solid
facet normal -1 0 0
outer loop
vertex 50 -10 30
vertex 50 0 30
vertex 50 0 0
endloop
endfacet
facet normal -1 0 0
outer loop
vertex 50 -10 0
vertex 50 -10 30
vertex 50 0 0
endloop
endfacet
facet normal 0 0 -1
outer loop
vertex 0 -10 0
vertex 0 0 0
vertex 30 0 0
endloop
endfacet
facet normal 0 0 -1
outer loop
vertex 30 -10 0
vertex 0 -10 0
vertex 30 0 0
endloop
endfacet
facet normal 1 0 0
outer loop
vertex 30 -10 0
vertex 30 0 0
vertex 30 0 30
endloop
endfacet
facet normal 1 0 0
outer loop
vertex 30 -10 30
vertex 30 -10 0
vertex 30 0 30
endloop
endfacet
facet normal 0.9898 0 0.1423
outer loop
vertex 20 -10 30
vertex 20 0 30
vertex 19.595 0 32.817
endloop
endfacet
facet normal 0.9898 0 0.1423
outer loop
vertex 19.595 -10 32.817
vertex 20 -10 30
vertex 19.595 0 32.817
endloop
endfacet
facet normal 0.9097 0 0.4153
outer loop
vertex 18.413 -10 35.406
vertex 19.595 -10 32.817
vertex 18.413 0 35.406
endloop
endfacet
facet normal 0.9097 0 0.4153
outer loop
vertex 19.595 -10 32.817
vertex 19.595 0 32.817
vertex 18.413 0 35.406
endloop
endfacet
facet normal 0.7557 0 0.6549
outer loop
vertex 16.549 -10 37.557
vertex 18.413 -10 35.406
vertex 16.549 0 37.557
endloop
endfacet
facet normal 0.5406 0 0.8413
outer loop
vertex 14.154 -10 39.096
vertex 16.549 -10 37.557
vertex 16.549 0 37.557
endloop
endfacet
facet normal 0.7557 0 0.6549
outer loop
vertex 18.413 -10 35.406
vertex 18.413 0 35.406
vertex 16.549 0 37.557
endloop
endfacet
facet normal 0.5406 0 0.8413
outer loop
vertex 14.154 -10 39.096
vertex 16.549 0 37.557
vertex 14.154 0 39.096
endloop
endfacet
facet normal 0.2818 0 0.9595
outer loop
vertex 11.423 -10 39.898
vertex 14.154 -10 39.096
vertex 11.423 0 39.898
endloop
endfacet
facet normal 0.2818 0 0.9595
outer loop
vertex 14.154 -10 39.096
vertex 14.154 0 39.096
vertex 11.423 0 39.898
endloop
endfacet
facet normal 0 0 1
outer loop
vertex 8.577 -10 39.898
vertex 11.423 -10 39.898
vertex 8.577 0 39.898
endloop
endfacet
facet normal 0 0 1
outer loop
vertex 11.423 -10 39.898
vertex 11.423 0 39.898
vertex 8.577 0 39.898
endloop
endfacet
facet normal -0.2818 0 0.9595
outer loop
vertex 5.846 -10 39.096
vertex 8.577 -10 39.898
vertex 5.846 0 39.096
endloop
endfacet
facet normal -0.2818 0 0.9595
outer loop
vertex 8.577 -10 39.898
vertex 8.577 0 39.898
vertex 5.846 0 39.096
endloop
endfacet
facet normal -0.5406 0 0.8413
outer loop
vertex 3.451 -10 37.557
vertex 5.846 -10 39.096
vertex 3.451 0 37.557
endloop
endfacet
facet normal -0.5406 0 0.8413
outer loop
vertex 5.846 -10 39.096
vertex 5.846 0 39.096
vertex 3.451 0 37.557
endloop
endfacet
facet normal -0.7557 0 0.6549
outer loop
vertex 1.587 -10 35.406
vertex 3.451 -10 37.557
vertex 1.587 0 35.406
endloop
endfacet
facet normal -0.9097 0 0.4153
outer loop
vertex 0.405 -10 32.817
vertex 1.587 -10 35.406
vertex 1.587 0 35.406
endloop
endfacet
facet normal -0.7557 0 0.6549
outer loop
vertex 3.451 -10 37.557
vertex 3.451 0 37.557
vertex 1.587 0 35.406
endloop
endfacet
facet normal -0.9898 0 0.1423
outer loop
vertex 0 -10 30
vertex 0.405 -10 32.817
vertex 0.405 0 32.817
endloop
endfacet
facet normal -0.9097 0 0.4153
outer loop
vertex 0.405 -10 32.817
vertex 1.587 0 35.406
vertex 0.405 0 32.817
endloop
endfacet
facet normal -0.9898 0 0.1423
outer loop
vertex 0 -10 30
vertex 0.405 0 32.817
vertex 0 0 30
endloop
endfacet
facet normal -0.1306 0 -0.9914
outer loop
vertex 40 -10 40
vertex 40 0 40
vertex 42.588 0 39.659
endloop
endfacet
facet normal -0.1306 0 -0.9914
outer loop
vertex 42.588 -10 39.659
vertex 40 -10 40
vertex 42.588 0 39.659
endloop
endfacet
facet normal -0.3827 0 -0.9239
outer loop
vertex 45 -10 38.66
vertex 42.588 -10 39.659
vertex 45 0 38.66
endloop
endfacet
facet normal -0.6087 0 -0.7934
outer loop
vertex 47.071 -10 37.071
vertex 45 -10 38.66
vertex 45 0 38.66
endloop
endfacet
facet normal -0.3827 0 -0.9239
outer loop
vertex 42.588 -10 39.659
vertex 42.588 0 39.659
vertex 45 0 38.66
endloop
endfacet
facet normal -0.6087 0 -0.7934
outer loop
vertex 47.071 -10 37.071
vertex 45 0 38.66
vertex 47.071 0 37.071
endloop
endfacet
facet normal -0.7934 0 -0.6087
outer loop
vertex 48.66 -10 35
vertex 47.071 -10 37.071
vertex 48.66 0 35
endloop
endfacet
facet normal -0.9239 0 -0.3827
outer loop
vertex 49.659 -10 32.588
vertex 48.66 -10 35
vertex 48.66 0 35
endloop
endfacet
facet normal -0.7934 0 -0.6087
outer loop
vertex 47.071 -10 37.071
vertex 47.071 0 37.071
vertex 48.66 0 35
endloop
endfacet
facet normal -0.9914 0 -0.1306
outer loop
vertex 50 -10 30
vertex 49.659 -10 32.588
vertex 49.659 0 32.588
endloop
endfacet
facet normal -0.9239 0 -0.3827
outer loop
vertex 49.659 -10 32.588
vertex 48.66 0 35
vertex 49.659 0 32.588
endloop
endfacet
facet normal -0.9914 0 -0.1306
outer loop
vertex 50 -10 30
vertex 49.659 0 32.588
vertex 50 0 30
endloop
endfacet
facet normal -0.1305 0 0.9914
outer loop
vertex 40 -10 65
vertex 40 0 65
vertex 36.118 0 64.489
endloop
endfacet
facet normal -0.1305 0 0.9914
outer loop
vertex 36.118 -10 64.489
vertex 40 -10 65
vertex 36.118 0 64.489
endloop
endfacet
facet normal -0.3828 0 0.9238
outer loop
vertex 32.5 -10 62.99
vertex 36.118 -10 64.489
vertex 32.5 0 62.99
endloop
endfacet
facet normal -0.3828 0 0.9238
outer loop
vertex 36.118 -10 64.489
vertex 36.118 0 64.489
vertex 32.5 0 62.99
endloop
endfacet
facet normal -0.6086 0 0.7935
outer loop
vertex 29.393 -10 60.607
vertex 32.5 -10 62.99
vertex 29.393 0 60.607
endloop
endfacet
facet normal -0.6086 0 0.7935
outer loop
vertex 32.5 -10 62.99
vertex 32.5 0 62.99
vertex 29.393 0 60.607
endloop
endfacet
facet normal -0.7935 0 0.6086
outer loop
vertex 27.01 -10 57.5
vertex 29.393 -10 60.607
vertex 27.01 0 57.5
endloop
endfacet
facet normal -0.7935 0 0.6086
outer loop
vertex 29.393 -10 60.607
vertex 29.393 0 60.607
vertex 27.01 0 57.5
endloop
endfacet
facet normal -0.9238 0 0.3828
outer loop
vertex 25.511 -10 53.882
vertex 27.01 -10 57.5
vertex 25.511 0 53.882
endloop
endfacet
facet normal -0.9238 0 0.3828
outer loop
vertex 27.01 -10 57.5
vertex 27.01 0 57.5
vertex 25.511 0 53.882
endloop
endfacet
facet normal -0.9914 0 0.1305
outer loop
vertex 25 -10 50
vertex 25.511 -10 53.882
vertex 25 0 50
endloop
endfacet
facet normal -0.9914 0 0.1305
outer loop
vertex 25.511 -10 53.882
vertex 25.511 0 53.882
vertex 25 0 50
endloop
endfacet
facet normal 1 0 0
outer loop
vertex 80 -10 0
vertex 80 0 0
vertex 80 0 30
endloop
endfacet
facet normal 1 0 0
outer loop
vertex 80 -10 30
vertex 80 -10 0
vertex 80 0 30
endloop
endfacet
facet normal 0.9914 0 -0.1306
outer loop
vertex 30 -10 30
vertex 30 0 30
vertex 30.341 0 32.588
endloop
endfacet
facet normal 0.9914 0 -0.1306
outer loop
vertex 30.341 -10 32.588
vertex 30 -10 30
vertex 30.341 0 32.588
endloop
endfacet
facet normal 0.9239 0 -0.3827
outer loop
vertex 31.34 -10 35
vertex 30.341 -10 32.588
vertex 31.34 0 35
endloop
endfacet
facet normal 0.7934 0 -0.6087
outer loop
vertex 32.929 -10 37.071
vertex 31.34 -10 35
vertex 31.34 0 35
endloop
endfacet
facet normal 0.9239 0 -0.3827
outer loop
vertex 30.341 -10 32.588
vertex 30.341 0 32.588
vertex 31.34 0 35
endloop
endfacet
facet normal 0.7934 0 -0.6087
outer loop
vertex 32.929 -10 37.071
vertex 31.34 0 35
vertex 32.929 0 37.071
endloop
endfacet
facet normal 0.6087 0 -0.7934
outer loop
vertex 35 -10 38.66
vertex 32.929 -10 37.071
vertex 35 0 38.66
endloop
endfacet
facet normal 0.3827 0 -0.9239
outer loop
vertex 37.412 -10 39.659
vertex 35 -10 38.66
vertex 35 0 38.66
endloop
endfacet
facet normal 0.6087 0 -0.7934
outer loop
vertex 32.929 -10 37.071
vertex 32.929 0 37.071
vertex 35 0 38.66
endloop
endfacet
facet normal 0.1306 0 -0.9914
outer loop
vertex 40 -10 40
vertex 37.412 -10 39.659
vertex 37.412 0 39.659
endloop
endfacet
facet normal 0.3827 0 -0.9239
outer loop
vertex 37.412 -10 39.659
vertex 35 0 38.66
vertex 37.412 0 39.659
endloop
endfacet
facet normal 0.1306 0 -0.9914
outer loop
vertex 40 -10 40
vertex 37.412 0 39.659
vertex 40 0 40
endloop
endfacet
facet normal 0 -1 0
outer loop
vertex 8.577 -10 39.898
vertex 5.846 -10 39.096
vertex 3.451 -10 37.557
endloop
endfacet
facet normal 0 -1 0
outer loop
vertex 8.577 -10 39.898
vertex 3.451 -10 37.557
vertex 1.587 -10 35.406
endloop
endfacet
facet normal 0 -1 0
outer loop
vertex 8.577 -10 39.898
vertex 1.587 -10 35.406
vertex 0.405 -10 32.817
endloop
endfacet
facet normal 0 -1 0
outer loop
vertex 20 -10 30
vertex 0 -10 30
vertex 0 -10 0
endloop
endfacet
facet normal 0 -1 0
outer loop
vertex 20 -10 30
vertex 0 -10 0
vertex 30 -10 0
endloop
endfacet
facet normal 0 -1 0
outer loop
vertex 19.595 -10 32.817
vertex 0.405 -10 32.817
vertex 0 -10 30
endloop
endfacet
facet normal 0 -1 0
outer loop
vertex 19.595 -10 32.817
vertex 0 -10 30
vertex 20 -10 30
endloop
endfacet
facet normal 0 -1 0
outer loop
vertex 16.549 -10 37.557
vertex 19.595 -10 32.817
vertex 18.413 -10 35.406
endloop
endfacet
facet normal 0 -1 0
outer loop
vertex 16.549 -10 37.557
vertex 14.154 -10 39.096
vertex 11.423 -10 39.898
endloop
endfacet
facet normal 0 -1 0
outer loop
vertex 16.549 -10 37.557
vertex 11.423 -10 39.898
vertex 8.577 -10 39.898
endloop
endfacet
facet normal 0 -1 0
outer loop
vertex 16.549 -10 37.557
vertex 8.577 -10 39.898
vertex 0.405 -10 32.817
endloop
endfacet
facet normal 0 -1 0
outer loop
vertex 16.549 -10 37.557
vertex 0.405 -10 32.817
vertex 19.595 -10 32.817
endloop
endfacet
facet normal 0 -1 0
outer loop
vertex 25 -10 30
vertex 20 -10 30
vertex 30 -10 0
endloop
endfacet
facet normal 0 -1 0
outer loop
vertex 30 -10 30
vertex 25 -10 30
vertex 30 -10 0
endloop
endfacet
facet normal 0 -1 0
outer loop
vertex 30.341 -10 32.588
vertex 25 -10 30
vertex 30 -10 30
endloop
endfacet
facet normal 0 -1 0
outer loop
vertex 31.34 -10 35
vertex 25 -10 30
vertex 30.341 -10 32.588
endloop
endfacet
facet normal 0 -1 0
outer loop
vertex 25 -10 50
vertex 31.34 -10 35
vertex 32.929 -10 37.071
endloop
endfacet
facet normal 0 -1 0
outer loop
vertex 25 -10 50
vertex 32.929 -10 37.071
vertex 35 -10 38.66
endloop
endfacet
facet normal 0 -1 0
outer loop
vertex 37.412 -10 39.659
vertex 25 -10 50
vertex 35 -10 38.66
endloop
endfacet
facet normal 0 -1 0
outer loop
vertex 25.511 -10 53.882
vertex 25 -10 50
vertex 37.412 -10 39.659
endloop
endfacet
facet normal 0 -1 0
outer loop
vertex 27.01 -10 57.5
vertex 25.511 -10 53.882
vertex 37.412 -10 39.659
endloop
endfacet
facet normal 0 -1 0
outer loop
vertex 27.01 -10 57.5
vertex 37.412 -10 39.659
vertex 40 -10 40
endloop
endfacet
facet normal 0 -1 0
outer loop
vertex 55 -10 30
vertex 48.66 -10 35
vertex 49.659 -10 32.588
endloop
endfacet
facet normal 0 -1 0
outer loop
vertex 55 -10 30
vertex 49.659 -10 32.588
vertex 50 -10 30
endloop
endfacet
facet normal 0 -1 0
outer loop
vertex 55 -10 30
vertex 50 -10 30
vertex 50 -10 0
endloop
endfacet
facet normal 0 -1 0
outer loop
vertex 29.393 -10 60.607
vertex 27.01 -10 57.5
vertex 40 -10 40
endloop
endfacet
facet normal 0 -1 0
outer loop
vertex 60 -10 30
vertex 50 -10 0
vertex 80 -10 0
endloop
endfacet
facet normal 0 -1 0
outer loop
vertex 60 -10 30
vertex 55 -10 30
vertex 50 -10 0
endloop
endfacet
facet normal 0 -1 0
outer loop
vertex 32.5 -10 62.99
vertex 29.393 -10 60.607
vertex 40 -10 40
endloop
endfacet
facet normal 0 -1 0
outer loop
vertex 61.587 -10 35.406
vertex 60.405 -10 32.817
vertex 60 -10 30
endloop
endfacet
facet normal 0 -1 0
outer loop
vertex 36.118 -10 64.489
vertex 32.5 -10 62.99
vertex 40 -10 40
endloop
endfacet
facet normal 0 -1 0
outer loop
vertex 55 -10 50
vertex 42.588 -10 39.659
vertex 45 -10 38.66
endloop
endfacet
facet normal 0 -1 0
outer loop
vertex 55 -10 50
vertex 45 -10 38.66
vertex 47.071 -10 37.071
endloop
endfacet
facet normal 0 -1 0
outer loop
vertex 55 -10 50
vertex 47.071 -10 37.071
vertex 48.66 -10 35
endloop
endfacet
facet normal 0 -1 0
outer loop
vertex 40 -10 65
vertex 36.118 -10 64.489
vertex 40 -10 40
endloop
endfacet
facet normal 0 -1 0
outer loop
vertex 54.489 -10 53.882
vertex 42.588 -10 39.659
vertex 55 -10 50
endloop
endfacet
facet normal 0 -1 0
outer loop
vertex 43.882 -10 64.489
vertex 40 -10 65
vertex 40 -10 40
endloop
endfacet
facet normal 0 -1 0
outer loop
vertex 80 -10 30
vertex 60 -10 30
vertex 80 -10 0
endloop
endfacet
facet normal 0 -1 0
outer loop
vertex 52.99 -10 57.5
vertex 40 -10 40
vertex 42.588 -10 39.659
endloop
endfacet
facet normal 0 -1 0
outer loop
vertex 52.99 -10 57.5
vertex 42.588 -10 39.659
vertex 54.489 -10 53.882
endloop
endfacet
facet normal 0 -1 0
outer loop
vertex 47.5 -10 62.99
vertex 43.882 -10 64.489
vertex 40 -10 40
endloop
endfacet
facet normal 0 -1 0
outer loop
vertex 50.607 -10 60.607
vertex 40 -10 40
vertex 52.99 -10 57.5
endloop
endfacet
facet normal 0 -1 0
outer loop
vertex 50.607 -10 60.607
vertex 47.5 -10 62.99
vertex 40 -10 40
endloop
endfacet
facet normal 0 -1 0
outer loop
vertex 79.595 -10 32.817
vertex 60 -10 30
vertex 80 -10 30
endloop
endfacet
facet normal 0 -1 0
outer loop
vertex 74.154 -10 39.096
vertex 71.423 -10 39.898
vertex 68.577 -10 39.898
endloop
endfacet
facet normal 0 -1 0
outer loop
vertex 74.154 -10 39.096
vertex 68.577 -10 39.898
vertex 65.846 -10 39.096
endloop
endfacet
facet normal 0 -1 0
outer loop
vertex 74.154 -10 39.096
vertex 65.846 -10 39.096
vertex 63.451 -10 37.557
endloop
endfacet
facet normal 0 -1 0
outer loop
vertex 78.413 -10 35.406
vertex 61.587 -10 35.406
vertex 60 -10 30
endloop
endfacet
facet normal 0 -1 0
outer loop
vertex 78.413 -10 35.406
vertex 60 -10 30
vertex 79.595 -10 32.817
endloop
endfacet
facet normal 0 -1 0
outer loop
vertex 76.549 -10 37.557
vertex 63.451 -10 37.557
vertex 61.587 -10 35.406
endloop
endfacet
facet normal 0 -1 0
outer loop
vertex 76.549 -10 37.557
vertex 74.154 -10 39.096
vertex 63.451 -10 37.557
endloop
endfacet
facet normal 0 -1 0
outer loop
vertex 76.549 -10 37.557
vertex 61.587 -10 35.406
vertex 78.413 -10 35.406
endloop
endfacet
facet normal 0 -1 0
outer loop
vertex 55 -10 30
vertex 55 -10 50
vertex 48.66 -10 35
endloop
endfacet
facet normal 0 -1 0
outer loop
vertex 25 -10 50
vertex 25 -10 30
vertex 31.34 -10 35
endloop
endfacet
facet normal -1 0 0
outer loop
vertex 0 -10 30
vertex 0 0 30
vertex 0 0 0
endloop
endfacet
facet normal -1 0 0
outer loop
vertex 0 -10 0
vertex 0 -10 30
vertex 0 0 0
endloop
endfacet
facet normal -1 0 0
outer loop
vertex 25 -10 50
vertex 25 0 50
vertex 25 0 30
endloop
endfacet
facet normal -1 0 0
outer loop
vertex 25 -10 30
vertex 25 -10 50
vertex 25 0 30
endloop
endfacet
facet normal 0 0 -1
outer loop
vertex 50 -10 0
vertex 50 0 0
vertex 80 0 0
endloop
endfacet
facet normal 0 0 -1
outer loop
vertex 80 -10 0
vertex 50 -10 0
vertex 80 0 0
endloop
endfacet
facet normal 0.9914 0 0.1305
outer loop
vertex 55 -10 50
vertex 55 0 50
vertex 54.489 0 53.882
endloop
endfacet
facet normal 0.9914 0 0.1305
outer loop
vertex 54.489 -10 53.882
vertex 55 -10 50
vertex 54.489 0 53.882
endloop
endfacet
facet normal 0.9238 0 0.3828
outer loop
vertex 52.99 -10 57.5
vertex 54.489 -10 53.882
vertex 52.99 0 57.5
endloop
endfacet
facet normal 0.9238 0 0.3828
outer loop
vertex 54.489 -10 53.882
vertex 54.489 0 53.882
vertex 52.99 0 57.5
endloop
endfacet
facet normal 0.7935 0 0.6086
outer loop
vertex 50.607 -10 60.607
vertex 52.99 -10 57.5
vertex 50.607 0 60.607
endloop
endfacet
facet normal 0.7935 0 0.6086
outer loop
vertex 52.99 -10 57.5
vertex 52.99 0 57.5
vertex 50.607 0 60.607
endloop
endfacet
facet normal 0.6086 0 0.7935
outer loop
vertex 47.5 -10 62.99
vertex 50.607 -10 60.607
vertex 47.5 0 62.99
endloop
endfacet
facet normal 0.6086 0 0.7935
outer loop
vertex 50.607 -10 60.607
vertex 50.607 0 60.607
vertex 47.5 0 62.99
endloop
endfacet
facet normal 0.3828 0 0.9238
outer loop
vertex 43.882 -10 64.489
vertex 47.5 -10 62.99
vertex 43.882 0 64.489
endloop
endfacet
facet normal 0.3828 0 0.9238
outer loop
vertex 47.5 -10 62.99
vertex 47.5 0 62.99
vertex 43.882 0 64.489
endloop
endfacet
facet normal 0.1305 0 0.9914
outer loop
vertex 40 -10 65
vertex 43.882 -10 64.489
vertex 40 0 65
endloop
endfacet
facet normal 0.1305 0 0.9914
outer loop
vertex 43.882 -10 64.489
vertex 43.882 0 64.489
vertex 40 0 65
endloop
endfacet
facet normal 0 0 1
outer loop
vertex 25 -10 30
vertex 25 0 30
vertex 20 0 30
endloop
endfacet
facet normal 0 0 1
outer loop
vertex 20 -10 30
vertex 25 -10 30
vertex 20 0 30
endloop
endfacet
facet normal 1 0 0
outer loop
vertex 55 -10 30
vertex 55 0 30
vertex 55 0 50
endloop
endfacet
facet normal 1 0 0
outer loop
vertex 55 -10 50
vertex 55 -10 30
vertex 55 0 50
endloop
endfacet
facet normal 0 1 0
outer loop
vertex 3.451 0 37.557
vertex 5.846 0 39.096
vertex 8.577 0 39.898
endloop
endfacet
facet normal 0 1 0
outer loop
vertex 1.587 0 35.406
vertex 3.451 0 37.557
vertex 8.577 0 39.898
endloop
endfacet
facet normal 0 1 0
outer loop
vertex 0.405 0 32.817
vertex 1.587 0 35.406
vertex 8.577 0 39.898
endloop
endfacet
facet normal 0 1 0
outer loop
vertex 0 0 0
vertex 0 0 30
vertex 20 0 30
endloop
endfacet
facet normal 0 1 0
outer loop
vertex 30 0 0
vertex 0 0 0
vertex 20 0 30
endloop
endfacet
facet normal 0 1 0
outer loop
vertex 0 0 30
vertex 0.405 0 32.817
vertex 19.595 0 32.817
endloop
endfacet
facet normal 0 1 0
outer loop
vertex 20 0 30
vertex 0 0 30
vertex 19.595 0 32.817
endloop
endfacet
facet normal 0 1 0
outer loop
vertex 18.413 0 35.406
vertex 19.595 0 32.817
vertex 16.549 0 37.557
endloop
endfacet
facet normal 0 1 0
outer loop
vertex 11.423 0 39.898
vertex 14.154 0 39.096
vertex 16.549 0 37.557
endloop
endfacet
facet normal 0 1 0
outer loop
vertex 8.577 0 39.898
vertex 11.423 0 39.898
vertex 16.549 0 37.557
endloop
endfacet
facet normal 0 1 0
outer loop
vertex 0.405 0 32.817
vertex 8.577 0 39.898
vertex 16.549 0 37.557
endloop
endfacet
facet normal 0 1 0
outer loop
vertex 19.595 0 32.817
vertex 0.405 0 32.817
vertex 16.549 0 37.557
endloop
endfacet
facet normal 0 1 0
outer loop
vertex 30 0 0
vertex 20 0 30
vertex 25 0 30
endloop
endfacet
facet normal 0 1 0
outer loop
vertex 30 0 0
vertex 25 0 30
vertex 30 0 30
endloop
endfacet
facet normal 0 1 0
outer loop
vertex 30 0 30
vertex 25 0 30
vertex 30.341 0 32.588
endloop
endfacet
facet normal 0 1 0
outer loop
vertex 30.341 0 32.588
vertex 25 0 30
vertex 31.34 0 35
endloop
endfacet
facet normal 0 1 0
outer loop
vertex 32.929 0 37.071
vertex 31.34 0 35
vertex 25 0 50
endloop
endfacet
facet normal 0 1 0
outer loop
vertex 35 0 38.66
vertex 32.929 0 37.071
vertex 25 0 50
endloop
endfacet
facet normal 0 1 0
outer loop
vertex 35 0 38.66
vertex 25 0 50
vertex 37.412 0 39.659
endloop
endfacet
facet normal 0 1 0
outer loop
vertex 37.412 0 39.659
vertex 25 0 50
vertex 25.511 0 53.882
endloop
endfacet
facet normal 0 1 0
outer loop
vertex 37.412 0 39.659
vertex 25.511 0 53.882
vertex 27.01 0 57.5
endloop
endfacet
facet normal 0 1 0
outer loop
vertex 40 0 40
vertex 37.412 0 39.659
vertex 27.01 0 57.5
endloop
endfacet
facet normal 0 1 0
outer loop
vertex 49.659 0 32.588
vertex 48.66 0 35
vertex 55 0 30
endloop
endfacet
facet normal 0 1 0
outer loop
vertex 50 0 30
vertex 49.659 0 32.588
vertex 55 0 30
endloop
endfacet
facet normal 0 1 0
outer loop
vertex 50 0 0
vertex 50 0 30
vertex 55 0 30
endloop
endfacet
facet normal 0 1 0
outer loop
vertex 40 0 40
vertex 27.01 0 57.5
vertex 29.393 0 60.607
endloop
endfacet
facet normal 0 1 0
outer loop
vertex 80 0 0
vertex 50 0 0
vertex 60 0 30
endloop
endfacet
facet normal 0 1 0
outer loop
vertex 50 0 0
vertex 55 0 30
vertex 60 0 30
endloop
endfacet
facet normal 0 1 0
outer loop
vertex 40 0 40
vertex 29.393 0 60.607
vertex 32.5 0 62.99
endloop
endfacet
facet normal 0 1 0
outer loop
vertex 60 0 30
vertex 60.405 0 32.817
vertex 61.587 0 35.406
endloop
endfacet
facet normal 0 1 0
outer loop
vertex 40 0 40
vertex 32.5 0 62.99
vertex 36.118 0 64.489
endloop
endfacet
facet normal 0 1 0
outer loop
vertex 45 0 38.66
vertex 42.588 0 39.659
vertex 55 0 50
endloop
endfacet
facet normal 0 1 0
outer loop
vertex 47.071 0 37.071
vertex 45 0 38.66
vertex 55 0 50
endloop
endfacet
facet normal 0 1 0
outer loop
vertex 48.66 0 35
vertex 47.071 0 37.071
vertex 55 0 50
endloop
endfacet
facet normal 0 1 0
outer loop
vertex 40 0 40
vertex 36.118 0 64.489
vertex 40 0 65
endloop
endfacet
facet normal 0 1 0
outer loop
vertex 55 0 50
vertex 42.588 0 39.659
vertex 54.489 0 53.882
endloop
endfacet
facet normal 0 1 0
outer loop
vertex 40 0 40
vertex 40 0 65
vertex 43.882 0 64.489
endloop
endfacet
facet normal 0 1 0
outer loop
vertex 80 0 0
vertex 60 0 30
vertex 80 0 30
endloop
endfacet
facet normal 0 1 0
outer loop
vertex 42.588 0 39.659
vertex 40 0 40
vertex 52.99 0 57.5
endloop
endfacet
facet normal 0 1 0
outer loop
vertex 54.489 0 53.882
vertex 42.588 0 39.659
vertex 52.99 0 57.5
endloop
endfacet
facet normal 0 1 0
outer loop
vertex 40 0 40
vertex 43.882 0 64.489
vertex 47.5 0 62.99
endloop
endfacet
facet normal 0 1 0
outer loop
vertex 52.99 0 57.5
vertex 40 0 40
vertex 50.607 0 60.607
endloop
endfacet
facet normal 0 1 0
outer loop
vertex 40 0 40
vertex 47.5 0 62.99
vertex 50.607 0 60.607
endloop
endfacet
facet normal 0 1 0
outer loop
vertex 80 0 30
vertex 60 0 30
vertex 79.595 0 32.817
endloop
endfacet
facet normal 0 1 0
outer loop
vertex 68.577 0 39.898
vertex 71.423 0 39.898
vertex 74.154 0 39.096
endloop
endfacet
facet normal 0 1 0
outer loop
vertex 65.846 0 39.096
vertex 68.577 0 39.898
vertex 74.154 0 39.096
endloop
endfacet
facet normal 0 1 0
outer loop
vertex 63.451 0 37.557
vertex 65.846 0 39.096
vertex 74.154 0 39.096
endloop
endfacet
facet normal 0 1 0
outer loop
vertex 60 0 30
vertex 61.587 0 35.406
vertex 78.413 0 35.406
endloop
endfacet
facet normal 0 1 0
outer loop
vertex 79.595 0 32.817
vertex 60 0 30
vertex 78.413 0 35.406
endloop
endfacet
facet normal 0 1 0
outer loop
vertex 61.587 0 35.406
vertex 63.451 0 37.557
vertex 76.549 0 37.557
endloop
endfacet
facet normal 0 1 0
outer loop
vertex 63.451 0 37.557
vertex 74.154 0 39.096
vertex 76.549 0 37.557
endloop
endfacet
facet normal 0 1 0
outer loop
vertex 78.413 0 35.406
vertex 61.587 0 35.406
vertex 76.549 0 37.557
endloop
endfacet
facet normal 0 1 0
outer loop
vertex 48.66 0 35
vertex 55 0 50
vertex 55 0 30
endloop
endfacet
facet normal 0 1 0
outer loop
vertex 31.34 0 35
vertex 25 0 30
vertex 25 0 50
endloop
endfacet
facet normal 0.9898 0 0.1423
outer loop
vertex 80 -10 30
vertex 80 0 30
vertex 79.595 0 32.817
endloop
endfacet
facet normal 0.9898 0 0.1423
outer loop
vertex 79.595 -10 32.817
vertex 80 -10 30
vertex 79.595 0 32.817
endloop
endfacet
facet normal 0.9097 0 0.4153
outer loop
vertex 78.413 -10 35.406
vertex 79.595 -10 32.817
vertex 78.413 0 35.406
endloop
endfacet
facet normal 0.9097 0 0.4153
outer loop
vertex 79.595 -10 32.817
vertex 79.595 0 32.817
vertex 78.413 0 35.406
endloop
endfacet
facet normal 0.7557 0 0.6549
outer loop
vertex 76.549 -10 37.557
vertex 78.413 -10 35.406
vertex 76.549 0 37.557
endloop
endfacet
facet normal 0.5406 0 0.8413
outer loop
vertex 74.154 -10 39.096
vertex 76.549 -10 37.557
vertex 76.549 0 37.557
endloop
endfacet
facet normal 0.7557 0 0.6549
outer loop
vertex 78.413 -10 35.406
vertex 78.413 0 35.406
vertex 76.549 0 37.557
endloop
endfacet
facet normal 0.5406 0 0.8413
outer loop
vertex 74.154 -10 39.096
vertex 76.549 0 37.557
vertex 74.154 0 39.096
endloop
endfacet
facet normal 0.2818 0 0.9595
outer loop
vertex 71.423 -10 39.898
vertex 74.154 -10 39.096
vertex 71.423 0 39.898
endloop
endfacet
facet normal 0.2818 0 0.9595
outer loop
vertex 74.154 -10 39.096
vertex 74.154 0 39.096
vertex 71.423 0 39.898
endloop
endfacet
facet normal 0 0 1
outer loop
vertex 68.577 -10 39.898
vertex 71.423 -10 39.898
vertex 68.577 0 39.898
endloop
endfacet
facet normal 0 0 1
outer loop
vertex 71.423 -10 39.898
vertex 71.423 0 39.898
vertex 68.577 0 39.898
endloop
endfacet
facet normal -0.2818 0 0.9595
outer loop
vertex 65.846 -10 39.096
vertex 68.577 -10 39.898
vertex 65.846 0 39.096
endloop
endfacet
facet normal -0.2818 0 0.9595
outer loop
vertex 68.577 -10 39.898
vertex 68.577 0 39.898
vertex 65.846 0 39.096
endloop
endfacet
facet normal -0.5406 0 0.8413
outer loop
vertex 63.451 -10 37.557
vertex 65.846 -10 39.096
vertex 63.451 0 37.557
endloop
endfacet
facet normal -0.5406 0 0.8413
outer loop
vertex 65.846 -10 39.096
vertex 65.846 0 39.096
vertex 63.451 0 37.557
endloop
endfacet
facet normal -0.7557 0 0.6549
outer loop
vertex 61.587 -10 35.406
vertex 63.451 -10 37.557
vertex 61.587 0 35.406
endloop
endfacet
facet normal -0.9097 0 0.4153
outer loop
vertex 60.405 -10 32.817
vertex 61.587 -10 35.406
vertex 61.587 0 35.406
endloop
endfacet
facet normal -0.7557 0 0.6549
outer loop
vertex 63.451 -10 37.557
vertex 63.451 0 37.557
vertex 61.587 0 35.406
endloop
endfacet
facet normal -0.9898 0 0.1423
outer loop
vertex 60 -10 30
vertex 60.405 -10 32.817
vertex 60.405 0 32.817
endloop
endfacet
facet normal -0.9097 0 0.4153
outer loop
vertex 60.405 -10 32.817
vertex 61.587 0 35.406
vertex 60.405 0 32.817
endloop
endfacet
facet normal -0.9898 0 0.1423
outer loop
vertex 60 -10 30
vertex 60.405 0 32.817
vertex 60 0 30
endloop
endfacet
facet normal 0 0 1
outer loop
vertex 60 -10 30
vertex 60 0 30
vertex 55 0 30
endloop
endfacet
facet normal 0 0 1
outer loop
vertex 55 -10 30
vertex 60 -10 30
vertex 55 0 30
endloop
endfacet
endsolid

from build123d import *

# Parameters (mm, degrees)
F1_DEPTH = 10


with BuildPart() as f1:
    # F0 (on Front) → F1 (new body)
    with BuildSketch(Plane.XZ):
        with BuildLine():
            Line((0, 30), (0, 0))
            Line((0, 0), (30, 0))
            Line((30, 0), (30, 30))
            ThreePointArc((30, 30), (32.928932, 37.071068), (40, 40))
            ThreePointArc((40, 40), (47.071068, 37.071068), (50, 30))
            Line((50, 30), (50, 0))
            Line((50, 0), (80, 0))
            Line((80, 0), (80, 30))
            ThreePointArc((80, 30), (70, 40), (60, 30))
            Line((60, 30), (55, 30))
            Line((55, 30), (55, 50))
            ThreePointArc((55, 50), (50.606602, 60.606602), (40, 65))
            ThreePointArc((40, 65), (29.393398, 60.606602), (25, 50))
            Line((25, 50), (25, 30))
            Line((25, 30), (20, 30))
            ThreePointArc((20, 30), (10, 40), (0, 30))
        make_face()
    extrude(amount=F1_DEPTH)


solid = f1.part
